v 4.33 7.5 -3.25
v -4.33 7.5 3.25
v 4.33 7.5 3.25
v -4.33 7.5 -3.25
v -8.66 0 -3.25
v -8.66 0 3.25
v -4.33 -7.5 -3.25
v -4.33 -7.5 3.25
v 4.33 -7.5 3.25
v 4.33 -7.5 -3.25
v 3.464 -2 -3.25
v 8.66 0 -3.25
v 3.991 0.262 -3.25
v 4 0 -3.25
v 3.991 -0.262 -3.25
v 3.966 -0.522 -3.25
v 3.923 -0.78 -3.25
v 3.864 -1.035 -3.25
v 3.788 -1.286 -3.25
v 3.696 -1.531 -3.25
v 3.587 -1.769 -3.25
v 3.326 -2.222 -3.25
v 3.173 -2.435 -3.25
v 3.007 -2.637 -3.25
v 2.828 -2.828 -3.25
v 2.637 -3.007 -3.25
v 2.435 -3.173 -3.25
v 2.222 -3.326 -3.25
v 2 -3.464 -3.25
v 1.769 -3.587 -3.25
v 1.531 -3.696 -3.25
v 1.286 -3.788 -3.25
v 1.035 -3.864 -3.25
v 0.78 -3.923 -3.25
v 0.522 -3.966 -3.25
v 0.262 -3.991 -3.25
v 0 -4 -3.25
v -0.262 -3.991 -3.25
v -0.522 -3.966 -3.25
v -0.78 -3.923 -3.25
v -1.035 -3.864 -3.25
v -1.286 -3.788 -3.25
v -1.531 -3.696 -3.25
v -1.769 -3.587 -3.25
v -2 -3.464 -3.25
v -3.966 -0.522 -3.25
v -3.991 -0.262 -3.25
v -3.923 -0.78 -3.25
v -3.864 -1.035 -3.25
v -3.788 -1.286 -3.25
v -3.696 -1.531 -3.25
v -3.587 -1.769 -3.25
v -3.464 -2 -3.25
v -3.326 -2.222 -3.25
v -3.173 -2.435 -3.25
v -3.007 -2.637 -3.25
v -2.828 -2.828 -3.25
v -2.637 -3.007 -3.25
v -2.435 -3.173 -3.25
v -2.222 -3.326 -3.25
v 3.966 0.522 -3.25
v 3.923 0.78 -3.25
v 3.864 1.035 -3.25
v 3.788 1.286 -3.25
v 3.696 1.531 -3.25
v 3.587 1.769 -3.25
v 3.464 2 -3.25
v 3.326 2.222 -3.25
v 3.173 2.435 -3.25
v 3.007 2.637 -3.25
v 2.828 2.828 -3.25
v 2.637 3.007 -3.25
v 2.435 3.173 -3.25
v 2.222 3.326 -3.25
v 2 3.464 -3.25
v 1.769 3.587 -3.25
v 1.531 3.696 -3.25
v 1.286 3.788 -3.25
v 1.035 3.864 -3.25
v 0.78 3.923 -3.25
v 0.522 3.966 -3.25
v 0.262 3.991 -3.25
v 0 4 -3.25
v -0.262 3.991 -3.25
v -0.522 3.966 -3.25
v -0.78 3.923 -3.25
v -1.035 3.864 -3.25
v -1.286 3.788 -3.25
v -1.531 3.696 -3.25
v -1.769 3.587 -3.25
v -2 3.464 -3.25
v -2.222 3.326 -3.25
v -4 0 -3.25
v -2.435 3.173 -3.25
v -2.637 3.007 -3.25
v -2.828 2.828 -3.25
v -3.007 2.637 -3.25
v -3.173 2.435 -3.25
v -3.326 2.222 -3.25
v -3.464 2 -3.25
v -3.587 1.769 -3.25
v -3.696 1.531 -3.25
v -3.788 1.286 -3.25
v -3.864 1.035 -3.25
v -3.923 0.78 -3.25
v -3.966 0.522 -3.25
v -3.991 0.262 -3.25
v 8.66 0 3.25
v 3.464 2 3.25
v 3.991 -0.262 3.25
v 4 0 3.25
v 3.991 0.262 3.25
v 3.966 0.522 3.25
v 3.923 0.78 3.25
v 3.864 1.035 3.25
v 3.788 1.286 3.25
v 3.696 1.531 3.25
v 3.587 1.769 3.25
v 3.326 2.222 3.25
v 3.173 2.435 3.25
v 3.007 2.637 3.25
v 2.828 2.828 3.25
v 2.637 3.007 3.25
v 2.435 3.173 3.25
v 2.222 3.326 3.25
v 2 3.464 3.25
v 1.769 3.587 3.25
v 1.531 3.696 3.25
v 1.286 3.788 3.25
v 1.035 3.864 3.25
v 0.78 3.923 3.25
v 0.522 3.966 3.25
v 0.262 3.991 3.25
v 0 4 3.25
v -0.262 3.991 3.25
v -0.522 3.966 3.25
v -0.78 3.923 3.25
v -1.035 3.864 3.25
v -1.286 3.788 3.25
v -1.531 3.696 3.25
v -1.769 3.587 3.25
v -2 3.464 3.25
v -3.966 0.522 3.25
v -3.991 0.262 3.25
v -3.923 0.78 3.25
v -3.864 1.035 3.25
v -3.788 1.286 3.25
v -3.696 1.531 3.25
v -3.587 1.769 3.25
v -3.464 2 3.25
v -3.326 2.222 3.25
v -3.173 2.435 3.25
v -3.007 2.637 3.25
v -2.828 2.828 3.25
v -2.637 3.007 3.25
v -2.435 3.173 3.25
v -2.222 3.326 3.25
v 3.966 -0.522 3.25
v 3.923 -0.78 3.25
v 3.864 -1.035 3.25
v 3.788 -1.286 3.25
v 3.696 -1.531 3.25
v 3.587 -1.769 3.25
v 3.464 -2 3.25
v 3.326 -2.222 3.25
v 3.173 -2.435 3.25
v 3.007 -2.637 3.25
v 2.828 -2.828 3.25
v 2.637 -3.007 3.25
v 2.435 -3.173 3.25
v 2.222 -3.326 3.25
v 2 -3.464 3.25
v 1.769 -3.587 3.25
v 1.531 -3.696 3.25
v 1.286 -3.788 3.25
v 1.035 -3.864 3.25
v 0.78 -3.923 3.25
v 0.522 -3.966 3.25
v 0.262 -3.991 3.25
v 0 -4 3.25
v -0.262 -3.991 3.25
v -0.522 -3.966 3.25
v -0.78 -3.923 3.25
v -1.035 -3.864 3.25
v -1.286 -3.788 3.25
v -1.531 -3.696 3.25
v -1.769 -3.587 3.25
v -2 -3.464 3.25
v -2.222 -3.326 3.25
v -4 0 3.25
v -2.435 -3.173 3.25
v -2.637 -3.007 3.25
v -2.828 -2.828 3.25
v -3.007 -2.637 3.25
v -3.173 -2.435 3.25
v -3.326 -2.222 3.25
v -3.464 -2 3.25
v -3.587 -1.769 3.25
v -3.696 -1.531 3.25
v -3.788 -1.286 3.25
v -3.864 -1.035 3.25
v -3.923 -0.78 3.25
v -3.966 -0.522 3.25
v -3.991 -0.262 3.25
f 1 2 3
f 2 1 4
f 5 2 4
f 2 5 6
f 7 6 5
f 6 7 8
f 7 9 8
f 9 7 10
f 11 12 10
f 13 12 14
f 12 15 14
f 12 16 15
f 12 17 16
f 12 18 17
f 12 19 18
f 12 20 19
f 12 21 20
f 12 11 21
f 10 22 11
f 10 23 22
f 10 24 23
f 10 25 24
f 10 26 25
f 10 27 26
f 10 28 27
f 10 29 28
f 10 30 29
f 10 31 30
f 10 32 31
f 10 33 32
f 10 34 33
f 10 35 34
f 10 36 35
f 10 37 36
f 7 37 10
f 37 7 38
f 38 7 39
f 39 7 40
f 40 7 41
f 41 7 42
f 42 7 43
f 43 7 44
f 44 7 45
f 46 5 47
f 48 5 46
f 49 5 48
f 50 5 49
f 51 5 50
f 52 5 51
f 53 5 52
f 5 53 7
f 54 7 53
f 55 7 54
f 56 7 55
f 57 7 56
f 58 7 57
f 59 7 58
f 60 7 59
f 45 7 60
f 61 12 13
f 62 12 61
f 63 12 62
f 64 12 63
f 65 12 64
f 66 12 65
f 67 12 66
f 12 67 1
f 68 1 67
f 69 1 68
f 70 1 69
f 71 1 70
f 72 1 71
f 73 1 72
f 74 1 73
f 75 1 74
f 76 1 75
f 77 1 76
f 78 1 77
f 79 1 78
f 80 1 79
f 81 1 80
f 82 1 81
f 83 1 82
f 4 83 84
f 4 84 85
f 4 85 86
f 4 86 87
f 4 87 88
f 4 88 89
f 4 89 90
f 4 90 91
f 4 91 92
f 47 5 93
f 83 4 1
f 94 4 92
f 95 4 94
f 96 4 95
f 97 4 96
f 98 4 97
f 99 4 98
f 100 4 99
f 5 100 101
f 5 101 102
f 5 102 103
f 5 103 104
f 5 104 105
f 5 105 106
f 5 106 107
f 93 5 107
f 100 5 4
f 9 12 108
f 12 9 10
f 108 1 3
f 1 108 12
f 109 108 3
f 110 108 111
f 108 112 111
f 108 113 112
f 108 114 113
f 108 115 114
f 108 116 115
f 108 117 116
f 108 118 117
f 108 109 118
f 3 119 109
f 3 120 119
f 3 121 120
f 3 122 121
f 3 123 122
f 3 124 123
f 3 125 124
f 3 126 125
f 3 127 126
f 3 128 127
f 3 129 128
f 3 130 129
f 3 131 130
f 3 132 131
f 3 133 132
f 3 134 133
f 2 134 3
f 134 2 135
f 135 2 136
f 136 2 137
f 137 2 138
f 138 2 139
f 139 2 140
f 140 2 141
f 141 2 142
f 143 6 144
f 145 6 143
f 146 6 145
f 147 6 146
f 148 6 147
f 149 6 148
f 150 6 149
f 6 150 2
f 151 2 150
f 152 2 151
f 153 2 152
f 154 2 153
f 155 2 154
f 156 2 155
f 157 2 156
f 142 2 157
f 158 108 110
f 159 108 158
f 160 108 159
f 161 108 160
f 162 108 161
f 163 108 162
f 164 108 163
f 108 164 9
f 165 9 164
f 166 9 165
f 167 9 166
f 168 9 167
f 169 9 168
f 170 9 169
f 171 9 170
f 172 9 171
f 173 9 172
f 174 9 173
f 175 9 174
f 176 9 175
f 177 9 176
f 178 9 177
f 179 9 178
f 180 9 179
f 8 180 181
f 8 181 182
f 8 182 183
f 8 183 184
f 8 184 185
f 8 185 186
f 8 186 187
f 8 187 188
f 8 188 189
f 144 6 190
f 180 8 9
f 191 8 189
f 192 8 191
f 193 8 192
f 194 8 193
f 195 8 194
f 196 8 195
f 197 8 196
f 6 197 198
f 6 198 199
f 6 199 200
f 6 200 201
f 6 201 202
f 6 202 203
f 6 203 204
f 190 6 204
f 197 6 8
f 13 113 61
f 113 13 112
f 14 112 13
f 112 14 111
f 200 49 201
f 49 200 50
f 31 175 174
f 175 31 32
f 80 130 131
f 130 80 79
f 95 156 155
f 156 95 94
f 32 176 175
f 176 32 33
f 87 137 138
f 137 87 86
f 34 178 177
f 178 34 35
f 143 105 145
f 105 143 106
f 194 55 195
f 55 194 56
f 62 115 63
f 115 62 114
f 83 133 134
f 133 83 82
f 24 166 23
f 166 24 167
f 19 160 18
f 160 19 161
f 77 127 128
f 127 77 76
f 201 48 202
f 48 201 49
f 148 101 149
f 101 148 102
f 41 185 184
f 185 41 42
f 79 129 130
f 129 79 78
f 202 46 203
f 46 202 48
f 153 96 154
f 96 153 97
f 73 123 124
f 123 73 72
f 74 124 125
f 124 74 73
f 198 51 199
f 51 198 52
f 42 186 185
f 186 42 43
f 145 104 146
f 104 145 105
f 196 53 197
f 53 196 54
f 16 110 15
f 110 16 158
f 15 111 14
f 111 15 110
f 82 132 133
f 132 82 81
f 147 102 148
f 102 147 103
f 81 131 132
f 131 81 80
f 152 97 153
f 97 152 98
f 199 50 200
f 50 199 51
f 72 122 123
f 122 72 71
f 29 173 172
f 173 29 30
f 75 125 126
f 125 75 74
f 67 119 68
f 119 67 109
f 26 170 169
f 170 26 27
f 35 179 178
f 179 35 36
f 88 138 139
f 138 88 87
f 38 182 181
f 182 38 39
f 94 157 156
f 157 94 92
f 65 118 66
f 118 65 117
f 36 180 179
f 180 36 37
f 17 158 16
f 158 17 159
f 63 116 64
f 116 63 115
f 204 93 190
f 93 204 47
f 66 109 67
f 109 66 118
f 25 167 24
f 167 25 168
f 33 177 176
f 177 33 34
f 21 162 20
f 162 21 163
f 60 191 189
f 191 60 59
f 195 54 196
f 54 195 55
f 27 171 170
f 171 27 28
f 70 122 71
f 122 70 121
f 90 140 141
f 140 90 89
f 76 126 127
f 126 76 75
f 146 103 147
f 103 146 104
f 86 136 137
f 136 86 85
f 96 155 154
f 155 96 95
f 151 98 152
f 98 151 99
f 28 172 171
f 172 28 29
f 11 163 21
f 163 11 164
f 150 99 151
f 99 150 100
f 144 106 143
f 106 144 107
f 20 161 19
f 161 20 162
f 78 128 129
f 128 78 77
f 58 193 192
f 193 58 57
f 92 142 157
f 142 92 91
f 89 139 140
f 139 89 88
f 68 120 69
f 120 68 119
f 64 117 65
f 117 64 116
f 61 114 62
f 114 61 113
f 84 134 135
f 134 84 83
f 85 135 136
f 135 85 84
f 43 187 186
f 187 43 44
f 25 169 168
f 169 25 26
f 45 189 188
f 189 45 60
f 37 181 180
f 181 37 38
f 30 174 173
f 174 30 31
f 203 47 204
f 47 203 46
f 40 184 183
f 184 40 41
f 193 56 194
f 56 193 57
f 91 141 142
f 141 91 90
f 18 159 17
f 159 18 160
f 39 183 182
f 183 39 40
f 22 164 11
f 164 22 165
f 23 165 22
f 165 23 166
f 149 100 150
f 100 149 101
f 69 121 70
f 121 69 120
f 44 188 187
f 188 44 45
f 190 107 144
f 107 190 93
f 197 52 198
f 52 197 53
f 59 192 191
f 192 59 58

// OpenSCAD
$fn=96;

nut_thickness = 6.5;
across_flats = 15.0;
hole_d = 8.0;

module hex_prism(af, h){
    r = af / sqrt(3);
    linear_extrude(height=h, center=true)
        polygon(points=[for(i=[0:5]) [r*cos(60*i), r*sin(60*i)]]);
}

module hex_nut(af, h, d){
    difference(){
        hex_prism(af, h);
        cylinder(d=d, h=h+0.6, center=true, $fn=96);
    }
}

hex_nut(across_flats, nut_thickness, hole_d);
